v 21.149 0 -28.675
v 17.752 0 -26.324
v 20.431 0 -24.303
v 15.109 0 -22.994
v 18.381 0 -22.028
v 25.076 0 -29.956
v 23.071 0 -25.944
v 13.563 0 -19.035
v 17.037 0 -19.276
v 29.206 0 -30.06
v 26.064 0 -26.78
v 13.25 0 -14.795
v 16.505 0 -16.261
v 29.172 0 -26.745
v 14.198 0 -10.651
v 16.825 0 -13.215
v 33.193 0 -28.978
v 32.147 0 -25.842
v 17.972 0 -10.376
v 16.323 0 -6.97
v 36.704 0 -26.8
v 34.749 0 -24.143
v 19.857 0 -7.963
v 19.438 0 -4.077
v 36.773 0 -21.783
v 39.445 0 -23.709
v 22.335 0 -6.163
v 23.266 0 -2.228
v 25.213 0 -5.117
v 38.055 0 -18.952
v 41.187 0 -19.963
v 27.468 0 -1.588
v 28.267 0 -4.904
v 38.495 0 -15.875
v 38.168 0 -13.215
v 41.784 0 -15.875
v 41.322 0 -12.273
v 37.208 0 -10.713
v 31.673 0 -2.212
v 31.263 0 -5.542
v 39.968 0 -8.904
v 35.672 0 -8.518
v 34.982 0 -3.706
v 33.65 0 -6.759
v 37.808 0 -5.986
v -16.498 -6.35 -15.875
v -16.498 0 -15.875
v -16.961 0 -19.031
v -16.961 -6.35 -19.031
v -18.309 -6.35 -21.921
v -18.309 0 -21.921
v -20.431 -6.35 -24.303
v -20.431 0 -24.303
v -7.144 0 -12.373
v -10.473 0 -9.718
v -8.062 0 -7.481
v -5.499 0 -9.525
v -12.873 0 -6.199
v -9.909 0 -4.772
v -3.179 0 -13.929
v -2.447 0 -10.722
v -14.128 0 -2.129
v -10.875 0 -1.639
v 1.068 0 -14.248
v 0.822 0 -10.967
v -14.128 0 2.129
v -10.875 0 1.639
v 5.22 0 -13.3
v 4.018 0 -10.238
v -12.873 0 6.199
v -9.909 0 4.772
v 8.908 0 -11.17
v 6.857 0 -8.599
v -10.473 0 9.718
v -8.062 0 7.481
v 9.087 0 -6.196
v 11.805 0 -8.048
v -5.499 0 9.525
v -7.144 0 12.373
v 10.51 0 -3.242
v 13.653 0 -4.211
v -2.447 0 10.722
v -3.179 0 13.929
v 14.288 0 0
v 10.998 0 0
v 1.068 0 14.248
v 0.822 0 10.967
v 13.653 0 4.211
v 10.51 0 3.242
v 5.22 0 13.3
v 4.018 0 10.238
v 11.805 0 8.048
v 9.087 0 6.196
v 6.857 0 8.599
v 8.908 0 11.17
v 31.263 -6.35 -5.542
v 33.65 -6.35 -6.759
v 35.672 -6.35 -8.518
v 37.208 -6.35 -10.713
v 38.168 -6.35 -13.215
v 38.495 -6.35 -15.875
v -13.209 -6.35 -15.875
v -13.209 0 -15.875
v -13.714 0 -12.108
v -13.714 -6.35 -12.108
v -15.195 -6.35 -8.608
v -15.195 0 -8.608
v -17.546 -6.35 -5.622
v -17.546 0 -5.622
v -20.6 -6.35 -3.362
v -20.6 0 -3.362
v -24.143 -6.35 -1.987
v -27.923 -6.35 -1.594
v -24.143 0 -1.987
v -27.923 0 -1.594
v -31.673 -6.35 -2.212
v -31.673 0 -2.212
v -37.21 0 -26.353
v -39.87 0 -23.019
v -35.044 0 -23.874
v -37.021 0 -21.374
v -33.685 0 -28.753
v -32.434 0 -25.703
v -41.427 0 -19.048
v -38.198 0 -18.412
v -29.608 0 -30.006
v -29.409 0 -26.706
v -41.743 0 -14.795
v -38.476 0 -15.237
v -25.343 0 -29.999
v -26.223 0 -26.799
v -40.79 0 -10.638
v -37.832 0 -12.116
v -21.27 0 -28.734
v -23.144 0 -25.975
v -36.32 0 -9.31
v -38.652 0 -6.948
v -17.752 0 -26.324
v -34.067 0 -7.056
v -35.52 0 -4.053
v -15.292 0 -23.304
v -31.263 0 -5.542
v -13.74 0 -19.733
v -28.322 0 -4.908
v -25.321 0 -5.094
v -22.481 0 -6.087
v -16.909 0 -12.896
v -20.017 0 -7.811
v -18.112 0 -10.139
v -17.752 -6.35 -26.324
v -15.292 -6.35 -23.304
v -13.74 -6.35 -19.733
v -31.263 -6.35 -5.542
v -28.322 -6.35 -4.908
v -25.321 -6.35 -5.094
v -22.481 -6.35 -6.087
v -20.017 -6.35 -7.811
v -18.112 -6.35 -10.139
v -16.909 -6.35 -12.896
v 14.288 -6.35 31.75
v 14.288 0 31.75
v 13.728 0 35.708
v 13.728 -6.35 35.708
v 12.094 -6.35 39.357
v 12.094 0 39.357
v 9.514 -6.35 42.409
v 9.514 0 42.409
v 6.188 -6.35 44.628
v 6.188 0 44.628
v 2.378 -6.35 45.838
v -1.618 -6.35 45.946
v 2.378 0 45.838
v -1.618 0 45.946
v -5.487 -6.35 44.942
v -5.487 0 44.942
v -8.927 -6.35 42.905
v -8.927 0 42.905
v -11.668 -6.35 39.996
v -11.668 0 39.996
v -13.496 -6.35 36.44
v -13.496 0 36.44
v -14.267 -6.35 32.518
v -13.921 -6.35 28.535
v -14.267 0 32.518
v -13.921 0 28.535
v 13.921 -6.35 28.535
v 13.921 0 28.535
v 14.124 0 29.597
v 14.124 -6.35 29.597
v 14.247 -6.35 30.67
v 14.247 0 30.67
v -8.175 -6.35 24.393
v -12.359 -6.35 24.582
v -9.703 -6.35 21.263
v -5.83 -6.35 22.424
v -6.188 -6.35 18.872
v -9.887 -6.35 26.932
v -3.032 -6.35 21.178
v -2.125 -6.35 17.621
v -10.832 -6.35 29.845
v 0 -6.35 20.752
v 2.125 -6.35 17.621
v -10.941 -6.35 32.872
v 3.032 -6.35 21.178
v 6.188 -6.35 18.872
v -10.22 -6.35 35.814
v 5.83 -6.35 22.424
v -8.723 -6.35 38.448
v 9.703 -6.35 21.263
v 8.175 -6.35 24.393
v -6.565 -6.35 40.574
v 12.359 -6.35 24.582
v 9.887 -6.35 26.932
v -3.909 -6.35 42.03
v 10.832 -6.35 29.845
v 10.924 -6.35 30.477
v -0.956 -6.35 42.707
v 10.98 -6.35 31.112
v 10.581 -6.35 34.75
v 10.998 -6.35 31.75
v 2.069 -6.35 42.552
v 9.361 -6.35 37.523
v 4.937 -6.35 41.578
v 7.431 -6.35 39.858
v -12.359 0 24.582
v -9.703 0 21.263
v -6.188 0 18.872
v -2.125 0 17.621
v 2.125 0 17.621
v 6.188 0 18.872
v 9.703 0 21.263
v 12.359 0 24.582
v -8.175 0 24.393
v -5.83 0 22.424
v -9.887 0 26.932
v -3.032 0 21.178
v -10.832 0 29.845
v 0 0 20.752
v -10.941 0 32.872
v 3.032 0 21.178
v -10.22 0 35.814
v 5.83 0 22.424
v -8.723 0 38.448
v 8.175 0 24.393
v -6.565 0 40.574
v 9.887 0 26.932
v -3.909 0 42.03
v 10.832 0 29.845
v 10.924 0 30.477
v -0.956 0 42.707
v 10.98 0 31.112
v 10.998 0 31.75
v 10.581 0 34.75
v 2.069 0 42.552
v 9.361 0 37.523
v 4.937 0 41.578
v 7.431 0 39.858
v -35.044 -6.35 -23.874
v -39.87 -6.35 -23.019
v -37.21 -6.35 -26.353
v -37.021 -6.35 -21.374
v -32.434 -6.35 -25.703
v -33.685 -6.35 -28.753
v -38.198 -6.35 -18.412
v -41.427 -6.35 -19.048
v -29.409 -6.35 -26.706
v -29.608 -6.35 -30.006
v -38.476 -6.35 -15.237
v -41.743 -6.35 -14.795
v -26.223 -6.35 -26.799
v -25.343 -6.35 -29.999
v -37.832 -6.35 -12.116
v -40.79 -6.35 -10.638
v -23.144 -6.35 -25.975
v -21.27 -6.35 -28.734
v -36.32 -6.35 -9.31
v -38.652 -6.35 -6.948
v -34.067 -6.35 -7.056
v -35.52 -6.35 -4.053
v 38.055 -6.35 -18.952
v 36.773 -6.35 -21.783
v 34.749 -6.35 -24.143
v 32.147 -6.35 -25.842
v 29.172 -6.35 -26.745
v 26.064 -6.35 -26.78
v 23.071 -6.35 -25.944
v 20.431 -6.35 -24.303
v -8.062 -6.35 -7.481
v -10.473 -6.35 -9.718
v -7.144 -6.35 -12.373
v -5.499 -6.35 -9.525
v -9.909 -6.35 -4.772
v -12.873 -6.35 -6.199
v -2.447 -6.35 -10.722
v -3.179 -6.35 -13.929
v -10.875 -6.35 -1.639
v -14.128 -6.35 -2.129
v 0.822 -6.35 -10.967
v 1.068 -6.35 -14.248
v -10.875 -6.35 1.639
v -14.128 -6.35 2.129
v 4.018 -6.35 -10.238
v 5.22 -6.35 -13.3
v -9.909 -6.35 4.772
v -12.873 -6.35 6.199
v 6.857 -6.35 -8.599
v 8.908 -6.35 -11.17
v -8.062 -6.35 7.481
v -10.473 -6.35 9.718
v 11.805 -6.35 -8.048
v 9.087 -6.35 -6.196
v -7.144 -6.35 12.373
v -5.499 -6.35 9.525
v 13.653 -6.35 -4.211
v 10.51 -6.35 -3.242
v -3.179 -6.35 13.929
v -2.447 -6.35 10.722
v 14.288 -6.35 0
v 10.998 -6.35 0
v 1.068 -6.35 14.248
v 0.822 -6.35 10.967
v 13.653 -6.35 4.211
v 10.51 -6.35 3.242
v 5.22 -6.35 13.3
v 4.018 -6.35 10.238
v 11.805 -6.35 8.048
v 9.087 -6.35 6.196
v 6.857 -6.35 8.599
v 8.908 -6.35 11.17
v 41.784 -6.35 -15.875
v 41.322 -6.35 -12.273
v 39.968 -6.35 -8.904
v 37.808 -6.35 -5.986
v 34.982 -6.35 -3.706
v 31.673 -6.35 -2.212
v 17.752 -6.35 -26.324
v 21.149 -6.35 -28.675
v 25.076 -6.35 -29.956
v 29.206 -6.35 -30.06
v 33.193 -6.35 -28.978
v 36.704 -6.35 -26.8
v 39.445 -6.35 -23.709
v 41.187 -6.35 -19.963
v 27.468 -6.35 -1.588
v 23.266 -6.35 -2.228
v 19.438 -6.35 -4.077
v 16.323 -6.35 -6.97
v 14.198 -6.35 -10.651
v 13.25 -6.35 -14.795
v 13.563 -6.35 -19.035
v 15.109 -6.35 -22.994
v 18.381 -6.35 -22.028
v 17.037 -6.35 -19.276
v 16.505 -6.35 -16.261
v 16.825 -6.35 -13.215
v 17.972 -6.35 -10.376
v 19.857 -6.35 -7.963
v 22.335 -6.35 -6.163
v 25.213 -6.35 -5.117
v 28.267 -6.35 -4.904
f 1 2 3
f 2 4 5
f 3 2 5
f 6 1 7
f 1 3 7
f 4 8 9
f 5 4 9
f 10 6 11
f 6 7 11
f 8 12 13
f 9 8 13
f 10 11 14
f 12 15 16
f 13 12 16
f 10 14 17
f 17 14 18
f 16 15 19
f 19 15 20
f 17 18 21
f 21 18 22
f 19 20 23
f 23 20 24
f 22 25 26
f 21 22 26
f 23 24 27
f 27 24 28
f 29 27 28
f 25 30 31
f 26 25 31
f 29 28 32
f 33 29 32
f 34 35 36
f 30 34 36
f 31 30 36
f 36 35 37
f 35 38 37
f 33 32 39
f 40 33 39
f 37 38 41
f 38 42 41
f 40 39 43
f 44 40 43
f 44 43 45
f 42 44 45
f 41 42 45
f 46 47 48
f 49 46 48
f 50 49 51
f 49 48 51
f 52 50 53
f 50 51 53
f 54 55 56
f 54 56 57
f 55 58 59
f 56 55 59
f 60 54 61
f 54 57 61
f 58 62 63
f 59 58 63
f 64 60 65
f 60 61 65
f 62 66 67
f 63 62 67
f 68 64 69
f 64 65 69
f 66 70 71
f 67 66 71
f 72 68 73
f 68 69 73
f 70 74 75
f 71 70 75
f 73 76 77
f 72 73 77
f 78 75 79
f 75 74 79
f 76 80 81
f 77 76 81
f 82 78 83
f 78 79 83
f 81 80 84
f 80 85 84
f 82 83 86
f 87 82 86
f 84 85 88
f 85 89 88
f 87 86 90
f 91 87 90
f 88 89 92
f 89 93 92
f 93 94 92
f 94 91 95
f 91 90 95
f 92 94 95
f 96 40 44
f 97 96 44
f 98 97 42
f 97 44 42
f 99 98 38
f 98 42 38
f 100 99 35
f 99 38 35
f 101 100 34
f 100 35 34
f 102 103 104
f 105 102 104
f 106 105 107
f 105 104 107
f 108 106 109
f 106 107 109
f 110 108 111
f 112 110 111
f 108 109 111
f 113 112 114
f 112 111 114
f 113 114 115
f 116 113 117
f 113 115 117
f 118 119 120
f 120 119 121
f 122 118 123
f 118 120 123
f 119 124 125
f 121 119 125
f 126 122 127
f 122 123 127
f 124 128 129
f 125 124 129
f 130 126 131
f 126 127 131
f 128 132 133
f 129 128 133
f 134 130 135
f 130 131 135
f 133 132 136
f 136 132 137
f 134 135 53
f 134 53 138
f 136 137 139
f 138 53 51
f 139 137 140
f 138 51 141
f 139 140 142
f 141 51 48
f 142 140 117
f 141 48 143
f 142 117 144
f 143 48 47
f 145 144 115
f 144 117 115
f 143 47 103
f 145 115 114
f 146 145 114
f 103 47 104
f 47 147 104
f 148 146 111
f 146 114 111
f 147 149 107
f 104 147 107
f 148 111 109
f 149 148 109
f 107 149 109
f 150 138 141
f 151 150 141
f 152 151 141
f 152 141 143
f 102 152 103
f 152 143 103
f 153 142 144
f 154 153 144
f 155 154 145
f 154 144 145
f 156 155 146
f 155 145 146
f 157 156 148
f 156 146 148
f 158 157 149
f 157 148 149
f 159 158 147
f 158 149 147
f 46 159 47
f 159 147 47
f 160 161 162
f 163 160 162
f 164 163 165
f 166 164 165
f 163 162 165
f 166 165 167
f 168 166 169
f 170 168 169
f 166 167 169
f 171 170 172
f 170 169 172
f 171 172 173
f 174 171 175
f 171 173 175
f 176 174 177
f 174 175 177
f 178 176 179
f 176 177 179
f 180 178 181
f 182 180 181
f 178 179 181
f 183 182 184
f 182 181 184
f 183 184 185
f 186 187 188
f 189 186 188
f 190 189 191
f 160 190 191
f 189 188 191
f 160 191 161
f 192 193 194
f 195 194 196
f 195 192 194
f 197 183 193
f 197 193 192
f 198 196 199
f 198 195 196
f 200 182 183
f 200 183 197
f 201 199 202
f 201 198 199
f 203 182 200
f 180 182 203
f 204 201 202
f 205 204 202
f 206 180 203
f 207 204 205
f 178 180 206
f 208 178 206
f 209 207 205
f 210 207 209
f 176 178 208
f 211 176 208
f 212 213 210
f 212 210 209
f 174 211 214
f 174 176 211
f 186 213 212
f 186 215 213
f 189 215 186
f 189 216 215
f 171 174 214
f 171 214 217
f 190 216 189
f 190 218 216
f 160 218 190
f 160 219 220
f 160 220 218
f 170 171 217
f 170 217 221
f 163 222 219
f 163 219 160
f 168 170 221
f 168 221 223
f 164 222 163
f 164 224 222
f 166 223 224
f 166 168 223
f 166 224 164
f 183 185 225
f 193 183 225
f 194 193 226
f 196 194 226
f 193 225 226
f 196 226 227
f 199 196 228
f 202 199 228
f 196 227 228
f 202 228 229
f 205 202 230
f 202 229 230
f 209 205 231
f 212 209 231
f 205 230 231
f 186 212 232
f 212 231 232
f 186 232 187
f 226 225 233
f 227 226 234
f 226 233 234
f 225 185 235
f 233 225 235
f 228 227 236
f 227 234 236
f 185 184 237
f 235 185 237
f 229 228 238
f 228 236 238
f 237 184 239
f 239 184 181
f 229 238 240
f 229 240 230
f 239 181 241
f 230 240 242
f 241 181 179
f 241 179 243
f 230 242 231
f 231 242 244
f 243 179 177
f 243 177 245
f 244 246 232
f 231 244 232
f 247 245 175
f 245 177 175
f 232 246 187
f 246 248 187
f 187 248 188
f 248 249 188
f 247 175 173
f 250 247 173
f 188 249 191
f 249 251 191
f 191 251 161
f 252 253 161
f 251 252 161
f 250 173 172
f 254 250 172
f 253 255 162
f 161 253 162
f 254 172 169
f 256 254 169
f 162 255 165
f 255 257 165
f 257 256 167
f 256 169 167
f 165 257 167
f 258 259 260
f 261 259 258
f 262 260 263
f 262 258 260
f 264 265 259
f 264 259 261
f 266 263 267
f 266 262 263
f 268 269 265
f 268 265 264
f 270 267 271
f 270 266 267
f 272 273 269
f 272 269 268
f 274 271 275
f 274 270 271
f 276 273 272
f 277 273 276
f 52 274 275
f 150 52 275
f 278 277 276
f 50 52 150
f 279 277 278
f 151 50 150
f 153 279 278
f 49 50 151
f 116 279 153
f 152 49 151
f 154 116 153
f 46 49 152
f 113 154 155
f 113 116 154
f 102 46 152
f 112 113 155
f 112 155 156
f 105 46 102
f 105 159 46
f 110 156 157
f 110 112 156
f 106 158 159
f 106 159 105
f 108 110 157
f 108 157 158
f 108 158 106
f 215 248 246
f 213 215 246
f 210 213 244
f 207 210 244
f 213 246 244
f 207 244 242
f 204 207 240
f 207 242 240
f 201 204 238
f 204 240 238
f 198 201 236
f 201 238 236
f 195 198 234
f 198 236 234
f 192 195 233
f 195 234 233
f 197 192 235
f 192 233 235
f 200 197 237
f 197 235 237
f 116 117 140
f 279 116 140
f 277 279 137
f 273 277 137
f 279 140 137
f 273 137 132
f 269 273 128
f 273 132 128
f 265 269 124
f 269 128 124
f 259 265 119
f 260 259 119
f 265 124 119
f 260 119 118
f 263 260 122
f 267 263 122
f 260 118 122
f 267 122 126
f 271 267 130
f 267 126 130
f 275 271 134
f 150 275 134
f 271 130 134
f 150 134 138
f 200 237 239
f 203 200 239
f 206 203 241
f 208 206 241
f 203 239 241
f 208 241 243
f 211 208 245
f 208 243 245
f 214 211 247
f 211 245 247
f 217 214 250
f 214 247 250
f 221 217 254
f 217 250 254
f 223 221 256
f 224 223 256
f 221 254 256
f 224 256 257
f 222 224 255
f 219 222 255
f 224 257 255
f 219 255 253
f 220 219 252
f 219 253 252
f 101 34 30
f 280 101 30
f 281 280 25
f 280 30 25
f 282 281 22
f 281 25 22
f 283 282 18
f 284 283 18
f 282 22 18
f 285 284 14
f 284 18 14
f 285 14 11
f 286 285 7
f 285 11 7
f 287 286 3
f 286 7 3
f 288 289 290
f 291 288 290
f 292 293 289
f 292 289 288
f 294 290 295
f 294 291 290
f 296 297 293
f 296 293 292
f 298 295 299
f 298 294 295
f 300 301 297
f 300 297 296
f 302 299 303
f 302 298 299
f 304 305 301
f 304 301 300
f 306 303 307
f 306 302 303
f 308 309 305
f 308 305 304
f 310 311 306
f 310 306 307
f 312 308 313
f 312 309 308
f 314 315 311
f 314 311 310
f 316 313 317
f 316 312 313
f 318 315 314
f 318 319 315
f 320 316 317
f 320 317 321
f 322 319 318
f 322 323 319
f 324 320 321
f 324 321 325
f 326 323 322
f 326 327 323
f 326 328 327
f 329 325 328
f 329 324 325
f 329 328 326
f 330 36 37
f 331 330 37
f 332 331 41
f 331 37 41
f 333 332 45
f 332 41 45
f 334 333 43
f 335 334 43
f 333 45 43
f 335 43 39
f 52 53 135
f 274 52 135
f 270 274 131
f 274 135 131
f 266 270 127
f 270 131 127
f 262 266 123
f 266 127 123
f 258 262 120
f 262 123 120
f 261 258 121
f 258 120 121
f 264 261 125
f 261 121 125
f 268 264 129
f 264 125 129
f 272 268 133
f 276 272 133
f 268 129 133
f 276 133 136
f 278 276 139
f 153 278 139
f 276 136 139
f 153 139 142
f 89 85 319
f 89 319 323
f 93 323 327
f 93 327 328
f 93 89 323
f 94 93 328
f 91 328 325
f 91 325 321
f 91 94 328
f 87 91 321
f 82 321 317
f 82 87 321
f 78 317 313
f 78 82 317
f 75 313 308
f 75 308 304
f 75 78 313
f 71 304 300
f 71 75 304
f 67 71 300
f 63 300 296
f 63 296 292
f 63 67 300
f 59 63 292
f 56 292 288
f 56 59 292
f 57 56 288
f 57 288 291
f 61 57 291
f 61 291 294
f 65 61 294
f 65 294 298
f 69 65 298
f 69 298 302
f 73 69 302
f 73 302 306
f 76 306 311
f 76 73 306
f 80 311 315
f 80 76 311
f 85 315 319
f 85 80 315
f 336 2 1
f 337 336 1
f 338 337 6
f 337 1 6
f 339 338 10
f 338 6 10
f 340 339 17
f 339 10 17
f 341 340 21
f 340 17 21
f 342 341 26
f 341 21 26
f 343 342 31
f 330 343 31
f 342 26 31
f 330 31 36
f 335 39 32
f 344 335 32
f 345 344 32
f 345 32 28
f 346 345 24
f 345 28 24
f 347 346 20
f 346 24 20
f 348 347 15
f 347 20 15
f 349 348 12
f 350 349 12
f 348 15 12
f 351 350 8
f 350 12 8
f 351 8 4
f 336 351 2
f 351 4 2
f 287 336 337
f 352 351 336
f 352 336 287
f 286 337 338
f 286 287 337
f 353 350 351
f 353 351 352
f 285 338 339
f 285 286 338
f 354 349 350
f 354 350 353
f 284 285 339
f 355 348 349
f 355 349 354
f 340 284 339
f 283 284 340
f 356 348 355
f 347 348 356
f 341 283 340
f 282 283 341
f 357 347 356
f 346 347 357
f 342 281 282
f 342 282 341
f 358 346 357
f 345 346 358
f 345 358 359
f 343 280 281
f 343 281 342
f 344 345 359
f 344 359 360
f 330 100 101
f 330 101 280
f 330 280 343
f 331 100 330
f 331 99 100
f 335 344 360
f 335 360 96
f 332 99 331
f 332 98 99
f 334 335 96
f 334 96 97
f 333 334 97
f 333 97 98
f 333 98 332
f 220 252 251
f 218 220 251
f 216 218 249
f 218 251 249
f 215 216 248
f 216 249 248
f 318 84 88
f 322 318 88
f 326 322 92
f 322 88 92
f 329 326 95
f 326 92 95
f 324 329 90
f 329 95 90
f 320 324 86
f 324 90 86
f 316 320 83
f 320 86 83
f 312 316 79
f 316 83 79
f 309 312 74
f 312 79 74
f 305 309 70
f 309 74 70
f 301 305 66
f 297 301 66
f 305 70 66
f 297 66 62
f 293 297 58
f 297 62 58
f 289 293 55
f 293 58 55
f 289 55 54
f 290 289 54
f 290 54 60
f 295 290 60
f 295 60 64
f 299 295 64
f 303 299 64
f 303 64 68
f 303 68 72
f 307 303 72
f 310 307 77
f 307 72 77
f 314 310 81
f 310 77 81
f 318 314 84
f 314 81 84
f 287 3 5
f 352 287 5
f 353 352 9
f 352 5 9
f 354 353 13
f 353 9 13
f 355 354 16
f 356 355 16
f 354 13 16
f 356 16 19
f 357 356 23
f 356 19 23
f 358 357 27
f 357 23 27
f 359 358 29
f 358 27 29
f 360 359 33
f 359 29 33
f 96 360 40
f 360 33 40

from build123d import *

# Parameters (mm, degrees)
F0_R     = 14.2875
F0_R_2   = 10.9982
F1_DEPTH = 6.35


with BuildPart() as f1:
    # F0 (on Front) → F1 (new body)
    with BuildSketch(Plane.XZ):
        with BuildLine():
            ThreePointArc((-13.208807, -15.875), (-18.997488, -4.390109), (-31.672881, -2.211586))
            ThreePointArc((-31.672881, -2.211586), (-31.511771, -3.882109), (-31.262615, -5.541785))
            ThreePointArc((-31.262615, -5.541785), (-21.190048, -6.864367), (-16.498107, -15.875))
            ThreePointArc((-16.498107, -15.875), (-17.52961, -20.525308), (-20.430635, -24.303326))
            ThreePointArc((-20.430635, -24.303326), (-19.117891, -25.34894), (-17.75173, -26.323727))
            ThreePointArc((-17.75173, -26.323727), (-14.393668, -21.571798), (-13.208807, -15.875))
        make_face()
        with BuildLine():
            ThreePointArc((-31.262615, -5.541785), (-31.511771, -3.882109), (-31.672881, -2.211586))
            ThreePointArc((-31.672881, -2.211586), (-39.869645, -23.01875), (-17.75173, -26.323727))
            ThreePointArc((-17.75173, -26.323727), (-19.117891, -25.34894), (-20.430635, -24.303326))
            ThreePointArc((-20.430635, -24.303326), (-37.021027, -21.3741), (-31.262615, -5.541785))
        make_face()
        with BuildLine():
            ThreePointArc((-10.831981, 29.845112), (-12.39388, 29.231049), (-13.921151, 28.535312))
            ThreePointArc((-13.921151, 28.535312), (0, 17.4625), (13.921151, 28.535312))
            ThreePointArc((13.921151, 28.535312), (12.39388, 29.231049), (10.831981, 29.845112))
            ThreePointArc((10.831981, 29.845112), (0, 20.7518), (-10.831981, 29.845112))
        make_face()
        with BuildLine():
            ThreePointArc((13.921151, 28.535312), (14.195617, 30.132253), (14.2875, 31.75))
            ThreePointArc((14.2875, 31.75), (-1.617747, 45.945617), (-13.921151, 28.535312))
            ThreePointArc((-13.921151, 28.535312), (-12.39388, 29.231049), (-10.831981, 29.845112))
            ThreePointArc((-10.831981, 29.845112), (-0.956063, 42.706566), (10.9982, 31.75))
            ThreePointArc((10.9982, 31.75), (10.956566, 30.793937), (10.831981, 29.845112))
            ThreePointArc((10.831981, 29.845112), (12.39388, 29.231049), (13.921151, 28.535312))
        make_face()
        Circle(F0_R)
        Circle(F0_R_2, mode=Mode.SUBTRACT)
        with BuildLine():
            ThreePointArc((31.262615, -5.541785), (31.511771, -3.882109), (31.672881, -2.211586))
            ThreePointArc((31.672881, -2.211586), (15.122969, -8.73125), (17.75173, -26.323727))
            ThreePointArc((17.75173, -26.323727), (19.117891, -25.34894), (20.430635, -24.303326))
            ThreePointArc((20.430635, -24.303326), (17.971586, -10.3759), (31.262615, -5.541785))
        make_face()
        with BuildLine():
            ThreePointArc((41.783807, -15.875), (38.981198, -7.376181), (31.672881, -2.211586))
            ThreePointArc((31.672881, -2.211586), (31.511771, -3.882109), (31.262615, -5.541785))
            ThreePointArc((31.262615, -5.541785), (36.50694, -9.568742), (38.494507, -15.875))
            ThreePointArc((38.494507, -15.875), (32.146615, -25.841696), (20.430635, -24.303326))
            ThreePointArc((20.430635, -24.303326), (19.117891, -25.34894), (17.75173, -26.323727))
            ThreePointArc((17.75173, -26.323727), (33.193105, -28.977639), (41.783807, -15.875))
        make_face()
    extrude(amount=F1_DEPTH)


solid = f1.part
